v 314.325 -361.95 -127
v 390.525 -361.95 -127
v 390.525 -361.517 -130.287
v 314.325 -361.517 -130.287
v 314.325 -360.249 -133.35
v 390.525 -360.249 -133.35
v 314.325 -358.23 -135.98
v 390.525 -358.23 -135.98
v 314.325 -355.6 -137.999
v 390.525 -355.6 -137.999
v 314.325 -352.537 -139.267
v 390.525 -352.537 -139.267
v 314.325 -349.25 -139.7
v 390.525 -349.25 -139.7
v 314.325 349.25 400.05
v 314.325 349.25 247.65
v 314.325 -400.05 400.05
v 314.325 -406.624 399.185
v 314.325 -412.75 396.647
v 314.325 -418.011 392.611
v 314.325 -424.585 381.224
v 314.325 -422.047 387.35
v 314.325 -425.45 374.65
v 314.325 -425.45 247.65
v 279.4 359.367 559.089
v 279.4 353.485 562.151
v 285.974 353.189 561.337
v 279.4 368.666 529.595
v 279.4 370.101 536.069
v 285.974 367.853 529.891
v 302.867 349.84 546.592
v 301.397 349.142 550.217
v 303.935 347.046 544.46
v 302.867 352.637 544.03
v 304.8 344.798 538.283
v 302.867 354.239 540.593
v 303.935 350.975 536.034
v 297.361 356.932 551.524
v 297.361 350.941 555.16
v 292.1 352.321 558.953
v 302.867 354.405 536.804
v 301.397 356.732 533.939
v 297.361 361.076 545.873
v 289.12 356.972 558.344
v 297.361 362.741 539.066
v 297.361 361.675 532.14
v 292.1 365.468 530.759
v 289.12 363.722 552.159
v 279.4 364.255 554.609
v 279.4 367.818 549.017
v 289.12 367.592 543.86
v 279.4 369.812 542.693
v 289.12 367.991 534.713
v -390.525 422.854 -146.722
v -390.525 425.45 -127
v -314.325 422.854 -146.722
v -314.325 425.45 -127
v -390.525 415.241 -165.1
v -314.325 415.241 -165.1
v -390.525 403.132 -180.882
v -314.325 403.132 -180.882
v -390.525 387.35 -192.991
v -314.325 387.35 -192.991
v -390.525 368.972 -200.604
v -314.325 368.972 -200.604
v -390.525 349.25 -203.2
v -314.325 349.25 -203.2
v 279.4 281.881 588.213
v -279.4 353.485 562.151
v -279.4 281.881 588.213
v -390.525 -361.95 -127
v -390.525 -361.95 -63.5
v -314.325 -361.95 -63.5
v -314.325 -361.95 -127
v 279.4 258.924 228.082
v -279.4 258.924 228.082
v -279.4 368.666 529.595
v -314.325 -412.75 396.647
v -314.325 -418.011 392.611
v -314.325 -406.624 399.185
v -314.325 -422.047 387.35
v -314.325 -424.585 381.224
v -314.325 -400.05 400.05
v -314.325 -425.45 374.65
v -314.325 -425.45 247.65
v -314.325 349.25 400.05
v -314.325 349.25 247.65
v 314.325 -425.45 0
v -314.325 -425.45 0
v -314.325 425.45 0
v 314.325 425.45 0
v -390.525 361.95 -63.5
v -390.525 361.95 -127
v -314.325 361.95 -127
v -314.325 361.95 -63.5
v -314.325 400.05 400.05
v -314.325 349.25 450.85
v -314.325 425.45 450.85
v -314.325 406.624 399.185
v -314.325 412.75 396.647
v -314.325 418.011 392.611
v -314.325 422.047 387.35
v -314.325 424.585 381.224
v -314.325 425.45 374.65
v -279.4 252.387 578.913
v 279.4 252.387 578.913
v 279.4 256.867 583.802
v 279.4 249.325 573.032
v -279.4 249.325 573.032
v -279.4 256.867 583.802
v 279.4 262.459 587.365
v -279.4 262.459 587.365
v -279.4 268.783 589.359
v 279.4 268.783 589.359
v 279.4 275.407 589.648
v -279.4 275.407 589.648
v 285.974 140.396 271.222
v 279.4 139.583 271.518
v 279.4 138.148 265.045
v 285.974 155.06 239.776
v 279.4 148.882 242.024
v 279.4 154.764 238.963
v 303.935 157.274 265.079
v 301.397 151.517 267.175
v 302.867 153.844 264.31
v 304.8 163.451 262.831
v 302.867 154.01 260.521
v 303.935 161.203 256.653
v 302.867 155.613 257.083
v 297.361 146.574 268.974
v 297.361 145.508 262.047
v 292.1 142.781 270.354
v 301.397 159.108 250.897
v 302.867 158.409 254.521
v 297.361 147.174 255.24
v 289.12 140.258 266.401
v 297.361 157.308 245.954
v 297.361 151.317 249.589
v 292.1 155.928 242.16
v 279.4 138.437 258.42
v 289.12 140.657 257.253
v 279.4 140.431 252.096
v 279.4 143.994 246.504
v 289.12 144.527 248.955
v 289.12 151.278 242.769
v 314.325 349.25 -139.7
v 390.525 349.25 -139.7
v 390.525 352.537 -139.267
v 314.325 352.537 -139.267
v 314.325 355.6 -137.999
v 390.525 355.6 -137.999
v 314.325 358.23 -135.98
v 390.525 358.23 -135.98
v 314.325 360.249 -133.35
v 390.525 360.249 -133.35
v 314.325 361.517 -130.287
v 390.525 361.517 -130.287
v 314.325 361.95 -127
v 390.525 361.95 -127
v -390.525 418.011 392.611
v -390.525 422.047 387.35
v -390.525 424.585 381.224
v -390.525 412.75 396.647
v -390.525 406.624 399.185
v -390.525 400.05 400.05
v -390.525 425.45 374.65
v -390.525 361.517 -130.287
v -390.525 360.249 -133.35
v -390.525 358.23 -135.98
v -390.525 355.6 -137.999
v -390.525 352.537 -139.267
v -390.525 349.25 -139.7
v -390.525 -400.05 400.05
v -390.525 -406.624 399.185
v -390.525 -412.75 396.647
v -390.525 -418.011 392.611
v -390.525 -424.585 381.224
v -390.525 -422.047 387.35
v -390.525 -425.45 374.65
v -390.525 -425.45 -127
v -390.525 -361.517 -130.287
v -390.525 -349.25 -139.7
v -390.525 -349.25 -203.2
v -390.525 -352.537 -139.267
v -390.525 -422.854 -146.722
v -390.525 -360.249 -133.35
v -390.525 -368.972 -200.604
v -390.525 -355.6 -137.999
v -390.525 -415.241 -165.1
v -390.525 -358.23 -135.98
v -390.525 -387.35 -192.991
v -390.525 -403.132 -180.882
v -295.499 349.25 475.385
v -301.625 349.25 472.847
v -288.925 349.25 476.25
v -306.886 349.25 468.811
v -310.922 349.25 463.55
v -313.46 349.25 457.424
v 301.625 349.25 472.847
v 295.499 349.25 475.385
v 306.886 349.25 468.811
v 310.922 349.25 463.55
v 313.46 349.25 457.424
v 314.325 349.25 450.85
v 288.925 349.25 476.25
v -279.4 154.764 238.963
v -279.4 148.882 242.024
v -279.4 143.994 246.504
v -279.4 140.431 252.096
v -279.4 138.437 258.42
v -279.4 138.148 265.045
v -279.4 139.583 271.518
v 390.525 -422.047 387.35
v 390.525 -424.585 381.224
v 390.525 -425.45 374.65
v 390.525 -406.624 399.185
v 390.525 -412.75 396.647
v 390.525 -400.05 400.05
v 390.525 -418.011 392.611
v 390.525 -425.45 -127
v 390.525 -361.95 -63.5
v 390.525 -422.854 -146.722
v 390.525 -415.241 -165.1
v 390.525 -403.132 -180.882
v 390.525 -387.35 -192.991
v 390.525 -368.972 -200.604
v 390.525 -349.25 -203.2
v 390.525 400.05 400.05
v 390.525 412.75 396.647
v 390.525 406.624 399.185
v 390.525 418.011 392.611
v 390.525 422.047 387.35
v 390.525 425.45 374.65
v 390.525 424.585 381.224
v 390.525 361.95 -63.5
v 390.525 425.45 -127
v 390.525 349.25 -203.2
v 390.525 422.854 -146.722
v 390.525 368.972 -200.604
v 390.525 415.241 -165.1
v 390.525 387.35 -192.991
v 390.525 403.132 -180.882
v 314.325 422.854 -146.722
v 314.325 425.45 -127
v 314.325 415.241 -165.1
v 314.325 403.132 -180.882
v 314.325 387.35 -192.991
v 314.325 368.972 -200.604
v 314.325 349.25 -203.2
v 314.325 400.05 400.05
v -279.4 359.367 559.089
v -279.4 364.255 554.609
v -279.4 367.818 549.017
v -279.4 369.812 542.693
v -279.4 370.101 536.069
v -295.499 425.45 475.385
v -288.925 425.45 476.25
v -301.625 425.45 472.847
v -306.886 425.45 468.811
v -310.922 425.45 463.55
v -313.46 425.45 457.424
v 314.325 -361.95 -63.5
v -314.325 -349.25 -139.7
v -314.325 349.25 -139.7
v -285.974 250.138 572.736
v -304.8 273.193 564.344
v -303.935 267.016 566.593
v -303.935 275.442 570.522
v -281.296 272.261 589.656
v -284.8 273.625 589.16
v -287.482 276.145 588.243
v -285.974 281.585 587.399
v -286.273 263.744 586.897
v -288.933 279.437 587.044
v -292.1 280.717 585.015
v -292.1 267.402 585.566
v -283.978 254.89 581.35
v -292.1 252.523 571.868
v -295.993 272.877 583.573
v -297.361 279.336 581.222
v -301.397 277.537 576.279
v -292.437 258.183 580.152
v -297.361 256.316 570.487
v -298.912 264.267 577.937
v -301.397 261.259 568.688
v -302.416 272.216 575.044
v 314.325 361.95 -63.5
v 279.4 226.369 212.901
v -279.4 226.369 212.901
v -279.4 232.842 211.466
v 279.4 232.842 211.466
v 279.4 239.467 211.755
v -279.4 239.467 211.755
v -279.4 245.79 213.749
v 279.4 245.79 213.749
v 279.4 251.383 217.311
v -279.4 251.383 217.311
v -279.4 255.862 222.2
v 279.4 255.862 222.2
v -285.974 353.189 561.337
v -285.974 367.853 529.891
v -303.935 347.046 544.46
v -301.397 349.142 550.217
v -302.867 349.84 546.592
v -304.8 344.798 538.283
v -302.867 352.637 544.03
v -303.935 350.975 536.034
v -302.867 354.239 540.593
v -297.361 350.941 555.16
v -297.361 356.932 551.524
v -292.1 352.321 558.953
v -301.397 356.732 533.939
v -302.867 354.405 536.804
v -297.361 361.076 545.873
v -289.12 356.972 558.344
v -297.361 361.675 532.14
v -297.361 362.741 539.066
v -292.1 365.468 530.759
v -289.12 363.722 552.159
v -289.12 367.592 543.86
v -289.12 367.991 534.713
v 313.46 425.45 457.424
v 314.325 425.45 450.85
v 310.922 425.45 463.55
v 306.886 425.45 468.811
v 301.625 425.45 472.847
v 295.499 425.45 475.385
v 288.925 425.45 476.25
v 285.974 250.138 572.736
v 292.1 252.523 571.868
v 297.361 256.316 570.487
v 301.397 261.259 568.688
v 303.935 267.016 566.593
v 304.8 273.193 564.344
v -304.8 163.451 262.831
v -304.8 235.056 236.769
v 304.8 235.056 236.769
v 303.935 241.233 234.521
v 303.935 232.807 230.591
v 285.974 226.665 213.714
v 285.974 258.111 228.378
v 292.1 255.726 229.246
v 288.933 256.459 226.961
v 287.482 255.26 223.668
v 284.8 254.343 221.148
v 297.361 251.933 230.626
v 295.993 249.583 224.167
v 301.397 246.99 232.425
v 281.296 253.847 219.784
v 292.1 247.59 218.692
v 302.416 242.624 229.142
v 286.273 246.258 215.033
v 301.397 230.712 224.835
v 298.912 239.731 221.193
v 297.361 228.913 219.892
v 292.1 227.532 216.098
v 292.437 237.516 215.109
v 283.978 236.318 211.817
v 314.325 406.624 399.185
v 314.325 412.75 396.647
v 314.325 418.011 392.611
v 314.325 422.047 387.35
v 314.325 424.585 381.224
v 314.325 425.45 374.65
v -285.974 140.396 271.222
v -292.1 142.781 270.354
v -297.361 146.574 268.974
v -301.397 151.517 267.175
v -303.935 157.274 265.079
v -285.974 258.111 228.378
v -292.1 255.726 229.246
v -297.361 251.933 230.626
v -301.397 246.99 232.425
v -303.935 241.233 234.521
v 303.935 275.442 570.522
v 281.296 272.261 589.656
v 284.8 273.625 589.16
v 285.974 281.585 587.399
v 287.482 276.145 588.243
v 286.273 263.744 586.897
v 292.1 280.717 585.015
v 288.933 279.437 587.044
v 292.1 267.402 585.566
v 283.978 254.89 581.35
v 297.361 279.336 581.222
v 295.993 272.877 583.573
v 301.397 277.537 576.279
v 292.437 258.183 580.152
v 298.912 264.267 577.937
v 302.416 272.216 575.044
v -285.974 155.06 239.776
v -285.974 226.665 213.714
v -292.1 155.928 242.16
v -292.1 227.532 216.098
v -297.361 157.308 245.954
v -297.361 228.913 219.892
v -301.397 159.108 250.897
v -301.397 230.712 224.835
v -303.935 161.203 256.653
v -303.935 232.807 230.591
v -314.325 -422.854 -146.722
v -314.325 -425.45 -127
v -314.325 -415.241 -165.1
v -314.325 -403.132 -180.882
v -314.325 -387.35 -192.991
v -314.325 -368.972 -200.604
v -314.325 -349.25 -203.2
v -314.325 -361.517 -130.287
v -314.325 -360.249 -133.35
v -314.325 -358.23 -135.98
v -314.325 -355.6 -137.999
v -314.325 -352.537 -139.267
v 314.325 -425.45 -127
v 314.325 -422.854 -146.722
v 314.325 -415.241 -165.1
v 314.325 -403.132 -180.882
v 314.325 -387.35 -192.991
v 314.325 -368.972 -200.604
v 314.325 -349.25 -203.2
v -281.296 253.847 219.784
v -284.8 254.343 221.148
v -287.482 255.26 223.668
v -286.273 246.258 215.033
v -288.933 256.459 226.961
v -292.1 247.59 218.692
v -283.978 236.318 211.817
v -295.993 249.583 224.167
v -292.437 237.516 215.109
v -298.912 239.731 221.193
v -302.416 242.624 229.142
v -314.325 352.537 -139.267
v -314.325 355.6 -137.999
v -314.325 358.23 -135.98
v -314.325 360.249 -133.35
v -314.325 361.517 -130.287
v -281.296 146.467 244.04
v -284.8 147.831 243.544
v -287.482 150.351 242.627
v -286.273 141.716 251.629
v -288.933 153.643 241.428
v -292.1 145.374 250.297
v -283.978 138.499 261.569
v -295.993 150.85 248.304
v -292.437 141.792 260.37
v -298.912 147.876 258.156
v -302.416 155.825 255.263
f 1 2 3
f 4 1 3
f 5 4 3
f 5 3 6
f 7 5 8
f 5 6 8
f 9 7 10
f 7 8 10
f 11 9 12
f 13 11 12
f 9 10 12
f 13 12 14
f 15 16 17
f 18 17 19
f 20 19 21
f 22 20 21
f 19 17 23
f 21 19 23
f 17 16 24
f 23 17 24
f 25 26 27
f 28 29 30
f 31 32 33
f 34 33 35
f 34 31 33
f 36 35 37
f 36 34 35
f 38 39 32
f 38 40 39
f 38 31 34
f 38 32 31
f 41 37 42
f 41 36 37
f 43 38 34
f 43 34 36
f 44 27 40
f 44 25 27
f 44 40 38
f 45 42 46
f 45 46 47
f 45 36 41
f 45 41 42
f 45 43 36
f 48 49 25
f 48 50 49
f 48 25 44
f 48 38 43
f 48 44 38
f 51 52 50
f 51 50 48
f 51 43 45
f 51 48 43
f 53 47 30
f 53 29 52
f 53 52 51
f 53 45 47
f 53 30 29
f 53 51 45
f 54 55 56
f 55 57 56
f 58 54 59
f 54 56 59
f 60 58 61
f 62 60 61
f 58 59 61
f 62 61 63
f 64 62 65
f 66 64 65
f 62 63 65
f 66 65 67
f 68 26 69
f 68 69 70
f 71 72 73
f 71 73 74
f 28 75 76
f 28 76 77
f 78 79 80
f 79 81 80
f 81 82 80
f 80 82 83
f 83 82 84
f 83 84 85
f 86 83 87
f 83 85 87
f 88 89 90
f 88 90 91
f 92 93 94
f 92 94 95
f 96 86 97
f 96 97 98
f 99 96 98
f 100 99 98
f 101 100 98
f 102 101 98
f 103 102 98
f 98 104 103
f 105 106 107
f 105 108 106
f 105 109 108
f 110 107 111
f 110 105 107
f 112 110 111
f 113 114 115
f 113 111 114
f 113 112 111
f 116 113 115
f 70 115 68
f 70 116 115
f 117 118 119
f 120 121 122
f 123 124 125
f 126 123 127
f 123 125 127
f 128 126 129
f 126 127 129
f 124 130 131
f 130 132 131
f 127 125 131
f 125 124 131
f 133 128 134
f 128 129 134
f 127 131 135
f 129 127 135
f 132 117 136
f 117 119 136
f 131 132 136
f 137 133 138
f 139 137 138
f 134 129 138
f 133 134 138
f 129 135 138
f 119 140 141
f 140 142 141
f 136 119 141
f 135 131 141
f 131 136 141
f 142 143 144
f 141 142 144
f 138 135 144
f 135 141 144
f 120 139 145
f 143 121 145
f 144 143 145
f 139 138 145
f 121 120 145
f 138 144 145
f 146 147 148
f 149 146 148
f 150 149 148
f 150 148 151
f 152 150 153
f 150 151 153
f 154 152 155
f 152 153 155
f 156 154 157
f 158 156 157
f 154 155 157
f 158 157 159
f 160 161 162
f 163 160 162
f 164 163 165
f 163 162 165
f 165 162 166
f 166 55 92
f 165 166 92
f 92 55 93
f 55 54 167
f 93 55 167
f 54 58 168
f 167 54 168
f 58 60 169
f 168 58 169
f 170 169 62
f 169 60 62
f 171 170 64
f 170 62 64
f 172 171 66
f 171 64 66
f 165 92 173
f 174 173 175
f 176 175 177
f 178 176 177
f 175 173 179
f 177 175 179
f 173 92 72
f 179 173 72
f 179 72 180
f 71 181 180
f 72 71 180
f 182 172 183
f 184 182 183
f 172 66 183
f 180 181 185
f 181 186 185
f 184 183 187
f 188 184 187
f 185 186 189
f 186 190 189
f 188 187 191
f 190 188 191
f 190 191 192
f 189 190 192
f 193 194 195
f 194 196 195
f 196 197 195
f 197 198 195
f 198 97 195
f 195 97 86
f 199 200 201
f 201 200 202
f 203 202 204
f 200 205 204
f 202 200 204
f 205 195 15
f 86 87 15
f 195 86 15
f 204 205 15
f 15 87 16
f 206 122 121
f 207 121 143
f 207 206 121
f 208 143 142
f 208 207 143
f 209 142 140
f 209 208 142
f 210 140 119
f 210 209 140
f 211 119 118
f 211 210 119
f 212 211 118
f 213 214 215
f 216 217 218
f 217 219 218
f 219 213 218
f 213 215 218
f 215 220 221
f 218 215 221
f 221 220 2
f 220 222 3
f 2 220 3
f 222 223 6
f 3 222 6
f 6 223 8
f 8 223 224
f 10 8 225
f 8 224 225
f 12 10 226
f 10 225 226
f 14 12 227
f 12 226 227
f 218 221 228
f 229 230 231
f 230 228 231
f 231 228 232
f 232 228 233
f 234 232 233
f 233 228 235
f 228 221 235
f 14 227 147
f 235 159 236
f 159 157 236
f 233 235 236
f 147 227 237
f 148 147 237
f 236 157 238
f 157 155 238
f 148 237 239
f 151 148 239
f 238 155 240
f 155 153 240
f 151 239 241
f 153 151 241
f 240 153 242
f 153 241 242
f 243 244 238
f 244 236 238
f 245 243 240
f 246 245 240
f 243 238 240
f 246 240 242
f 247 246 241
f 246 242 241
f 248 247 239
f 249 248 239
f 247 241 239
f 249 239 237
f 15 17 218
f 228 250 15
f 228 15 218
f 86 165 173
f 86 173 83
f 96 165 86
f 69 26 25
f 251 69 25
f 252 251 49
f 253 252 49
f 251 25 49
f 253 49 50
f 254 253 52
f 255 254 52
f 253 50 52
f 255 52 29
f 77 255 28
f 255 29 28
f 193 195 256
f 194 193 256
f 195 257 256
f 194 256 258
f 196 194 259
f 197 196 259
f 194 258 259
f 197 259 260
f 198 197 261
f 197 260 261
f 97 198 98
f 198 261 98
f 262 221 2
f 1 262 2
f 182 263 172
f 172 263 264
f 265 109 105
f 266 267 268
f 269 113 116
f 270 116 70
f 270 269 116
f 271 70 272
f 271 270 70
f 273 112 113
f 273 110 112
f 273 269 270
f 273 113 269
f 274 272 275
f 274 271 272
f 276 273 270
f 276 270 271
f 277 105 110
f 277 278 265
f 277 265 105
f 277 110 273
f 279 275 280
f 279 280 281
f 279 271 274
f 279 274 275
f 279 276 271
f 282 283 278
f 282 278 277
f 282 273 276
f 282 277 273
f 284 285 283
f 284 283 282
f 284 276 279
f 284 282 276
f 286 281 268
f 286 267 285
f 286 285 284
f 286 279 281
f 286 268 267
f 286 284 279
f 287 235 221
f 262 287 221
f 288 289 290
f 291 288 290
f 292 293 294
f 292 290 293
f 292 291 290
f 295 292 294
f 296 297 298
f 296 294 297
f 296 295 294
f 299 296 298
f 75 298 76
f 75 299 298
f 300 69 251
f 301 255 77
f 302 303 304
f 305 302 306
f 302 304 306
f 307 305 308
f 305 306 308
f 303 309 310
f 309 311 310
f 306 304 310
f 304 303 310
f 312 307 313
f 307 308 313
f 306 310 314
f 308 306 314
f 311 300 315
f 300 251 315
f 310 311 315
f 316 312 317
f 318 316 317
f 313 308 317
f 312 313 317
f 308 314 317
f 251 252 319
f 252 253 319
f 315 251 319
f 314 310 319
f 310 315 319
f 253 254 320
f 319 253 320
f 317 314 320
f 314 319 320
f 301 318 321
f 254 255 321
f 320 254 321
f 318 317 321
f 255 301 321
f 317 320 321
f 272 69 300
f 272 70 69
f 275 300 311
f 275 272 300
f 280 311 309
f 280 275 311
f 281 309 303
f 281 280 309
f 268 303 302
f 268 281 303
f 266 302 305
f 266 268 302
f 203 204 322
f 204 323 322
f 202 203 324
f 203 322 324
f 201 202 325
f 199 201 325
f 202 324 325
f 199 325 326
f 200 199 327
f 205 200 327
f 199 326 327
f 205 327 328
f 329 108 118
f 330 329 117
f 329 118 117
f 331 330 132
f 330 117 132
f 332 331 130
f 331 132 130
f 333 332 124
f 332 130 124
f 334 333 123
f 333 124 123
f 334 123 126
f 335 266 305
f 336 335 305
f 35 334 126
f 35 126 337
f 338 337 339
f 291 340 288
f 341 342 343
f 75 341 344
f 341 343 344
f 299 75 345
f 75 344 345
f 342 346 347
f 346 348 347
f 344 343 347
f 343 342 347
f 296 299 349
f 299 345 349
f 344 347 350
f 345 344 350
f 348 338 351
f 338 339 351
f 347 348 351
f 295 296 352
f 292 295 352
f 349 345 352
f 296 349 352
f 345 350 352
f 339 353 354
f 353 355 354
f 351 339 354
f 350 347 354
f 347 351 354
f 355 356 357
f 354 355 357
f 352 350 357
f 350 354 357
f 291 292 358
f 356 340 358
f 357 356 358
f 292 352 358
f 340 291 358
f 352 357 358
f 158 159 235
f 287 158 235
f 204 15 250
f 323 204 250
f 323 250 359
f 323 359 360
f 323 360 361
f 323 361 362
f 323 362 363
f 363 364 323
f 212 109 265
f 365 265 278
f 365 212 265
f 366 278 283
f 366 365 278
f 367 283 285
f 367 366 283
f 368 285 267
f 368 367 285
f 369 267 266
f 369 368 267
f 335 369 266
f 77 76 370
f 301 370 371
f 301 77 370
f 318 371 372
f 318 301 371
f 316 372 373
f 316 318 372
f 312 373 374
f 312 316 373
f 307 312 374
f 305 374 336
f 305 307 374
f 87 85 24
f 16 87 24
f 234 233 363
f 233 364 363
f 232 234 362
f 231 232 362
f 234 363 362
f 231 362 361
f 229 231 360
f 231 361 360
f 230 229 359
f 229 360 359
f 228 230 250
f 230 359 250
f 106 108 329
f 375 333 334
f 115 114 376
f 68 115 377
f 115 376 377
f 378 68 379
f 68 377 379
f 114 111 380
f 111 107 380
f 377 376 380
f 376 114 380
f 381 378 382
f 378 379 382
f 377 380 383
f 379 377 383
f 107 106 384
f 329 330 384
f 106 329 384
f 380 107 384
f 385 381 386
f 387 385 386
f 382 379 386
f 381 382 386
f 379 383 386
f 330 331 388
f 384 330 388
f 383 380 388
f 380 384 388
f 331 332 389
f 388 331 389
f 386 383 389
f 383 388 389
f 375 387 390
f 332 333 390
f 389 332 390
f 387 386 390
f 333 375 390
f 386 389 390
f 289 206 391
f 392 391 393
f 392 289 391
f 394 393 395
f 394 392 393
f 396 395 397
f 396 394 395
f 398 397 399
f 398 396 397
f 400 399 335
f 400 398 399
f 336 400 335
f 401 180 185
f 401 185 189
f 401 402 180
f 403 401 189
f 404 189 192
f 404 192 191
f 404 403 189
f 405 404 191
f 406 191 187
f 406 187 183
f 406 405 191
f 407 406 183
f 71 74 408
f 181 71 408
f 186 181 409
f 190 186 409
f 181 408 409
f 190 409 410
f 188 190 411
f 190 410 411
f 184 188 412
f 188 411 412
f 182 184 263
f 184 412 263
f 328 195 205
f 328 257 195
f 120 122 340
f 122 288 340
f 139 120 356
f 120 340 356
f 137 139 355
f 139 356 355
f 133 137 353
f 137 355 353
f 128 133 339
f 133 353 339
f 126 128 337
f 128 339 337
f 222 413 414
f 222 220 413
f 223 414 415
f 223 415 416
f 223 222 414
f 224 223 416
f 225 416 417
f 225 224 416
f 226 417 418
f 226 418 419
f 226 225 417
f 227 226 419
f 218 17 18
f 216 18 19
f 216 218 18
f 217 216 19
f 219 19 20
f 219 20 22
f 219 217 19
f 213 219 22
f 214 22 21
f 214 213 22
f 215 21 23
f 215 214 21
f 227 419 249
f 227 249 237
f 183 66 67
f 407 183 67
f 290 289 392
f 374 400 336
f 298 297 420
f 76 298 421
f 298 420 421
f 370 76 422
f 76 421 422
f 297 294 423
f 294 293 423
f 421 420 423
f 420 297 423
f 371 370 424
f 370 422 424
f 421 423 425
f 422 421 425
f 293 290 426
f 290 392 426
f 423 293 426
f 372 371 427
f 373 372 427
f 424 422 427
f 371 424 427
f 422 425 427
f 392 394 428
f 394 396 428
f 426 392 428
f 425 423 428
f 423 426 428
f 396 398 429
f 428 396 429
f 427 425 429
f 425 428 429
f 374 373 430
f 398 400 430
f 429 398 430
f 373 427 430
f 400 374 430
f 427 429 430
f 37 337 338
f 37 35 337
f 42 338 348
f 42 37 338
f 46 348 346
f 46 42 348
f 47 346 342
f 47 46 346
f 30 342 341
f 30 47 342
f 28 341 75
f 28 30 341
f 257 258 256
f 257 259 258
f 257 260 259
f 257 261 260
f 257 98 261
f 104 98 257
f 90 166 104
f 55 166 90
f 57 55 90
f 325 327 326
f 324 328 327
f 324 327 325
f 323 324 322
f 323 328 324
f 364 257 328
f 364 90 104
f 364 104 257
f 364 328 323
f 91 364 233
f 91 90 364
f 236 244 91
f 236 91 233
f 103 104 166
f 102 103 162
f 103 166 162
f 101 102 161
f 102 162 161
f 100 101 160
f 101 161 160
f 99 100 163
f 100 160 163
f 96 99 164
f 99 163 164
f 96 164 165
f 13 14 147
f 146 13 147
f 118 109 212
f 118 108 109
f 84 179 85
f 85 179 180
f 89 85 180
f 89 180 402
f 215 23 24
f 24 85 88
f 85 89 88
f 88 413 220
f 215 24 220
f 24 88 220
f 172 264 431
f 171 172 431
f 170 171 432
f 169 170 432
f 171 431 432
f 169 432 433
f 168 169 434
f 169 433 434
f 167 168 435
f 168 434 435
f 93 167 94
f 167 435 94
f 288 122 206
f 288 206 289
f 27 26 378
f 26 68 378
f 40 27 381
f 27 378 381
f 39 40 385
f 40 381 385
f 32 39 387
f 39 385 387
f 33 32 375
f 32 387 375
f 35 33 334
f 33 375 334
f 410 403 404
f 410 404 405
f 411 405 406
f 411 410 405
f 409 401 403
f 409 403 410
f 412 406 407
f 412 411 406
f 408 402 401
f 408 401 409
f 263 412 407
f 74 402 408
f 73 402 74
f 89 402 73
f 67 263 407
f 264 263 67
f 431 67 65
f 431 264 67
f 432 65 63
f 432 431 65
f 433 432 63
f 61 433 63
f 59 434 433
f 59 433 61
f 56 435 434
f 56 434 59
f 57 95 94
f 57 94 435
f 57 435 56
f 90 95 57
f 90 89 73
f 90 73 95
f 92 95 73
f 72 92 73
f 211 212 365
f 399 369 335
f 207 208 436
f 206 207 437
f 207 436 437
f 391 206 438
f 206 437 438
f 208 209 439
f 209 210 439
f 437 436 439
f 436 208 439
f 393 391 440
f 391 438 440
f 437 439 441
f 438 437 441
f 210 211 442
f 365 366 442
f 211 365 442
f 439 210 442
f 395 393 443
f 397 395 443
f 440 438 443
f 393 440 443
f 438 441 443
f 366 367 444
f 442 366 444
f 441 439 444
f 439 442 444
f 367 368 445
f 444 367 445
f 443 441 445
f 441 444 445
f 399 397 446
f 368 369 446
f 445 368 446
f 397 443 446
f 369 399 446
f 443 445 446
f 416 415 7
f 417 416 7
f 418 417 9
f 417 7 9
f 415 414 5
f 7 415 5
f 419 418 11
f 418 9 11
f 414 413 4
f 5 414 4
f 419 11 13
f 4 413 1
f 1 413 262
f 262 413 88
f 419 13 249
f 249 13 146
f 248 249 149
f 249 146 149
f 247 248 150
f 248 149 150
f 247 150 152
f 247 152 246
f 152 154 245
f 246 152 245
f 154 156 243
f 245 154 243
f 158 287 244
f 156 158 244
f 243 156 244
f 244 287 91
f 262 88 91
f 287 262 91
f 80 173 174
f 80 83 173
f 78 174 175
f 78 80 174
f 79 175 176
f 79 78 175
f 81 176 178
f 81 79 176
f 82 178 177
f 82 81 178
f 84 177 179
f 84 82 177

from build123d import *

# Parameters (mm, degrees)
F0_W      = 628.65
F0_H      = 850.9
F0_W_2    = 76.2
F1_DEPTH  = 247.65
F2_DEPTH  = 203.2
F4_DEPTH  = 152.4
F3_W      = 628.65
F3_H      = 76.2
F5_DEPTH  = 228.6
F6_R      = 76.2
F7_R      = 25.4
F9_DEPTH  = 781.051
F11_DEPTH = 304.8
F12_R     = 25.4


with BuildPart() as f1:
    # F0 (on Top) → F1 (new body)
    with BuildSketch(Plane.XY):
        Rectangle(F0_W, F0_H)
        with Locations((-352.425, 0)):
            Rectangle(F0_W_2, F0_H)
        with Locations((352.425, 0)):
            Rectangle(F0_W_2, F0_H)
    extrude(amount=F1_DEPTH)

    # F0 (on Top) → F2 (join)
    with BuildSketch(Plane.XY):
        with Locations((-352.425, 0)):
            Rectangle(F0_W_2, F0_H)
        with Locations((352.425, 0)):
            Rectangle(F0_W_2, F0_H)
    extrude(amount=-F2_DEPTH)

    # F3 (on face) → F4 (join)
    with BuildSketch(Plane.XY.offset(247.65)):
        Polygon((-314.325, 349.25), (-314.325, 425.45), (-390.525, 425.45), (-390.525, -425.45), (-314.325, -425.45), align=None)
        Polygon((390.525, -425.45), (390.525, 425.45), (314.325, 425.45), (314.325, 349.25), (314.325, -425.45), align=None)
    extrude(amount=F4_DEPTH)

    # F3 (on face) → F5 (join)
    with BuildSketch(Plane.XY.offset(247.65)):
        with Locations((0, 387.35)):
            Rectangle(F3_W, F3_H)
    extrude(amount=F5_DEPTH)

    # F6
    f6_edges = [f1.edges().sort_by_distance(p)[0] for p in [
        (-352.425, -425.45, -203.2),
        (352.425, -425.45, -203.2),
        (-352.425, 425.45, -203.2),
        (352.425, 425.45, -203.2),
    ]]
    fillet(f6_edges, radius=F6_R)

    # F7
    f7_edges = [f1.edges().sort_by_distance(p)[0] for p in [
        (352.425, 425.45, 400.05),
        (352.425, -425.45, 400.05),
        (-314.325, 387.35, 476.25),
        (314.325, 387.35, 476.25),
        (-352.425, 425.45, 400.05),
        (-352.425, -425.45, 400.05),
    ]]
    fillet(f7_edges, radius=F7_R)

    # F8 (on face) → F9 (cut, through all)
    with BuildSketch(Plane.YZ.offset(390.525)):
        with BuildLine():
            Line((361.95, -63.5), (-361.95, -63.5))
            Line((-361.95, -63.5), (-361.95, -127))
            ThreePointArc((-361.95, -127), (-358.2302561211, -135.9802561211), (-349.25, -139.7))
            Line((-349.25, -139.7), (349.25, -139.7))
            ThreePointArc((349.25, -139.7), (358.2302561211, -135.9802561211), (361.95, -127))
            Line((361.95, -127), (361.95, -63.5))
        make_face()
    extrude(amount=-F9_DEPTH, mode=Mode.SUBTRACT)


with BuildPart() as f11:
    # F10 (on Right) → F11 (new body, symmetric)
    with BuildSketch(Plane.YZ):
        Polygon((130.8958273423, 247.65), (250.2367901821, 204.2134417976), (377.3533944996, 553.4634417976), (258.0124316598, 596.9), align=None)
    extrude(amount=F11_DEPTH, both=True)

    # F12
    f12_edges = [f11.edges().sort_by_distance(p)[0] for p in [
        (-304.8, 194.45413, 422.275),
        (0, 130.895827, 247.65),
        (304.8, 194.45413, 422.275),
        (0, 258.012432, 596.9),
        (0, 377.353394, 553.463442),
        (-304.8, 317.682913, 575.181721),
        (304.8, 317.682913, 575.181721),
        (304.8, 190.566309, 225.931721),
        (304.8, 313.795092, 378.838442),
        (-304.8, 190.566309, 225.931721),
        (0, 250.23679, 204.213442),
        (-304.8, 313.795092, 378.838442),
    ]]
    fillet(f12_edges, radius=F12_R)


solid = Compound([f1.part, f11.part])
